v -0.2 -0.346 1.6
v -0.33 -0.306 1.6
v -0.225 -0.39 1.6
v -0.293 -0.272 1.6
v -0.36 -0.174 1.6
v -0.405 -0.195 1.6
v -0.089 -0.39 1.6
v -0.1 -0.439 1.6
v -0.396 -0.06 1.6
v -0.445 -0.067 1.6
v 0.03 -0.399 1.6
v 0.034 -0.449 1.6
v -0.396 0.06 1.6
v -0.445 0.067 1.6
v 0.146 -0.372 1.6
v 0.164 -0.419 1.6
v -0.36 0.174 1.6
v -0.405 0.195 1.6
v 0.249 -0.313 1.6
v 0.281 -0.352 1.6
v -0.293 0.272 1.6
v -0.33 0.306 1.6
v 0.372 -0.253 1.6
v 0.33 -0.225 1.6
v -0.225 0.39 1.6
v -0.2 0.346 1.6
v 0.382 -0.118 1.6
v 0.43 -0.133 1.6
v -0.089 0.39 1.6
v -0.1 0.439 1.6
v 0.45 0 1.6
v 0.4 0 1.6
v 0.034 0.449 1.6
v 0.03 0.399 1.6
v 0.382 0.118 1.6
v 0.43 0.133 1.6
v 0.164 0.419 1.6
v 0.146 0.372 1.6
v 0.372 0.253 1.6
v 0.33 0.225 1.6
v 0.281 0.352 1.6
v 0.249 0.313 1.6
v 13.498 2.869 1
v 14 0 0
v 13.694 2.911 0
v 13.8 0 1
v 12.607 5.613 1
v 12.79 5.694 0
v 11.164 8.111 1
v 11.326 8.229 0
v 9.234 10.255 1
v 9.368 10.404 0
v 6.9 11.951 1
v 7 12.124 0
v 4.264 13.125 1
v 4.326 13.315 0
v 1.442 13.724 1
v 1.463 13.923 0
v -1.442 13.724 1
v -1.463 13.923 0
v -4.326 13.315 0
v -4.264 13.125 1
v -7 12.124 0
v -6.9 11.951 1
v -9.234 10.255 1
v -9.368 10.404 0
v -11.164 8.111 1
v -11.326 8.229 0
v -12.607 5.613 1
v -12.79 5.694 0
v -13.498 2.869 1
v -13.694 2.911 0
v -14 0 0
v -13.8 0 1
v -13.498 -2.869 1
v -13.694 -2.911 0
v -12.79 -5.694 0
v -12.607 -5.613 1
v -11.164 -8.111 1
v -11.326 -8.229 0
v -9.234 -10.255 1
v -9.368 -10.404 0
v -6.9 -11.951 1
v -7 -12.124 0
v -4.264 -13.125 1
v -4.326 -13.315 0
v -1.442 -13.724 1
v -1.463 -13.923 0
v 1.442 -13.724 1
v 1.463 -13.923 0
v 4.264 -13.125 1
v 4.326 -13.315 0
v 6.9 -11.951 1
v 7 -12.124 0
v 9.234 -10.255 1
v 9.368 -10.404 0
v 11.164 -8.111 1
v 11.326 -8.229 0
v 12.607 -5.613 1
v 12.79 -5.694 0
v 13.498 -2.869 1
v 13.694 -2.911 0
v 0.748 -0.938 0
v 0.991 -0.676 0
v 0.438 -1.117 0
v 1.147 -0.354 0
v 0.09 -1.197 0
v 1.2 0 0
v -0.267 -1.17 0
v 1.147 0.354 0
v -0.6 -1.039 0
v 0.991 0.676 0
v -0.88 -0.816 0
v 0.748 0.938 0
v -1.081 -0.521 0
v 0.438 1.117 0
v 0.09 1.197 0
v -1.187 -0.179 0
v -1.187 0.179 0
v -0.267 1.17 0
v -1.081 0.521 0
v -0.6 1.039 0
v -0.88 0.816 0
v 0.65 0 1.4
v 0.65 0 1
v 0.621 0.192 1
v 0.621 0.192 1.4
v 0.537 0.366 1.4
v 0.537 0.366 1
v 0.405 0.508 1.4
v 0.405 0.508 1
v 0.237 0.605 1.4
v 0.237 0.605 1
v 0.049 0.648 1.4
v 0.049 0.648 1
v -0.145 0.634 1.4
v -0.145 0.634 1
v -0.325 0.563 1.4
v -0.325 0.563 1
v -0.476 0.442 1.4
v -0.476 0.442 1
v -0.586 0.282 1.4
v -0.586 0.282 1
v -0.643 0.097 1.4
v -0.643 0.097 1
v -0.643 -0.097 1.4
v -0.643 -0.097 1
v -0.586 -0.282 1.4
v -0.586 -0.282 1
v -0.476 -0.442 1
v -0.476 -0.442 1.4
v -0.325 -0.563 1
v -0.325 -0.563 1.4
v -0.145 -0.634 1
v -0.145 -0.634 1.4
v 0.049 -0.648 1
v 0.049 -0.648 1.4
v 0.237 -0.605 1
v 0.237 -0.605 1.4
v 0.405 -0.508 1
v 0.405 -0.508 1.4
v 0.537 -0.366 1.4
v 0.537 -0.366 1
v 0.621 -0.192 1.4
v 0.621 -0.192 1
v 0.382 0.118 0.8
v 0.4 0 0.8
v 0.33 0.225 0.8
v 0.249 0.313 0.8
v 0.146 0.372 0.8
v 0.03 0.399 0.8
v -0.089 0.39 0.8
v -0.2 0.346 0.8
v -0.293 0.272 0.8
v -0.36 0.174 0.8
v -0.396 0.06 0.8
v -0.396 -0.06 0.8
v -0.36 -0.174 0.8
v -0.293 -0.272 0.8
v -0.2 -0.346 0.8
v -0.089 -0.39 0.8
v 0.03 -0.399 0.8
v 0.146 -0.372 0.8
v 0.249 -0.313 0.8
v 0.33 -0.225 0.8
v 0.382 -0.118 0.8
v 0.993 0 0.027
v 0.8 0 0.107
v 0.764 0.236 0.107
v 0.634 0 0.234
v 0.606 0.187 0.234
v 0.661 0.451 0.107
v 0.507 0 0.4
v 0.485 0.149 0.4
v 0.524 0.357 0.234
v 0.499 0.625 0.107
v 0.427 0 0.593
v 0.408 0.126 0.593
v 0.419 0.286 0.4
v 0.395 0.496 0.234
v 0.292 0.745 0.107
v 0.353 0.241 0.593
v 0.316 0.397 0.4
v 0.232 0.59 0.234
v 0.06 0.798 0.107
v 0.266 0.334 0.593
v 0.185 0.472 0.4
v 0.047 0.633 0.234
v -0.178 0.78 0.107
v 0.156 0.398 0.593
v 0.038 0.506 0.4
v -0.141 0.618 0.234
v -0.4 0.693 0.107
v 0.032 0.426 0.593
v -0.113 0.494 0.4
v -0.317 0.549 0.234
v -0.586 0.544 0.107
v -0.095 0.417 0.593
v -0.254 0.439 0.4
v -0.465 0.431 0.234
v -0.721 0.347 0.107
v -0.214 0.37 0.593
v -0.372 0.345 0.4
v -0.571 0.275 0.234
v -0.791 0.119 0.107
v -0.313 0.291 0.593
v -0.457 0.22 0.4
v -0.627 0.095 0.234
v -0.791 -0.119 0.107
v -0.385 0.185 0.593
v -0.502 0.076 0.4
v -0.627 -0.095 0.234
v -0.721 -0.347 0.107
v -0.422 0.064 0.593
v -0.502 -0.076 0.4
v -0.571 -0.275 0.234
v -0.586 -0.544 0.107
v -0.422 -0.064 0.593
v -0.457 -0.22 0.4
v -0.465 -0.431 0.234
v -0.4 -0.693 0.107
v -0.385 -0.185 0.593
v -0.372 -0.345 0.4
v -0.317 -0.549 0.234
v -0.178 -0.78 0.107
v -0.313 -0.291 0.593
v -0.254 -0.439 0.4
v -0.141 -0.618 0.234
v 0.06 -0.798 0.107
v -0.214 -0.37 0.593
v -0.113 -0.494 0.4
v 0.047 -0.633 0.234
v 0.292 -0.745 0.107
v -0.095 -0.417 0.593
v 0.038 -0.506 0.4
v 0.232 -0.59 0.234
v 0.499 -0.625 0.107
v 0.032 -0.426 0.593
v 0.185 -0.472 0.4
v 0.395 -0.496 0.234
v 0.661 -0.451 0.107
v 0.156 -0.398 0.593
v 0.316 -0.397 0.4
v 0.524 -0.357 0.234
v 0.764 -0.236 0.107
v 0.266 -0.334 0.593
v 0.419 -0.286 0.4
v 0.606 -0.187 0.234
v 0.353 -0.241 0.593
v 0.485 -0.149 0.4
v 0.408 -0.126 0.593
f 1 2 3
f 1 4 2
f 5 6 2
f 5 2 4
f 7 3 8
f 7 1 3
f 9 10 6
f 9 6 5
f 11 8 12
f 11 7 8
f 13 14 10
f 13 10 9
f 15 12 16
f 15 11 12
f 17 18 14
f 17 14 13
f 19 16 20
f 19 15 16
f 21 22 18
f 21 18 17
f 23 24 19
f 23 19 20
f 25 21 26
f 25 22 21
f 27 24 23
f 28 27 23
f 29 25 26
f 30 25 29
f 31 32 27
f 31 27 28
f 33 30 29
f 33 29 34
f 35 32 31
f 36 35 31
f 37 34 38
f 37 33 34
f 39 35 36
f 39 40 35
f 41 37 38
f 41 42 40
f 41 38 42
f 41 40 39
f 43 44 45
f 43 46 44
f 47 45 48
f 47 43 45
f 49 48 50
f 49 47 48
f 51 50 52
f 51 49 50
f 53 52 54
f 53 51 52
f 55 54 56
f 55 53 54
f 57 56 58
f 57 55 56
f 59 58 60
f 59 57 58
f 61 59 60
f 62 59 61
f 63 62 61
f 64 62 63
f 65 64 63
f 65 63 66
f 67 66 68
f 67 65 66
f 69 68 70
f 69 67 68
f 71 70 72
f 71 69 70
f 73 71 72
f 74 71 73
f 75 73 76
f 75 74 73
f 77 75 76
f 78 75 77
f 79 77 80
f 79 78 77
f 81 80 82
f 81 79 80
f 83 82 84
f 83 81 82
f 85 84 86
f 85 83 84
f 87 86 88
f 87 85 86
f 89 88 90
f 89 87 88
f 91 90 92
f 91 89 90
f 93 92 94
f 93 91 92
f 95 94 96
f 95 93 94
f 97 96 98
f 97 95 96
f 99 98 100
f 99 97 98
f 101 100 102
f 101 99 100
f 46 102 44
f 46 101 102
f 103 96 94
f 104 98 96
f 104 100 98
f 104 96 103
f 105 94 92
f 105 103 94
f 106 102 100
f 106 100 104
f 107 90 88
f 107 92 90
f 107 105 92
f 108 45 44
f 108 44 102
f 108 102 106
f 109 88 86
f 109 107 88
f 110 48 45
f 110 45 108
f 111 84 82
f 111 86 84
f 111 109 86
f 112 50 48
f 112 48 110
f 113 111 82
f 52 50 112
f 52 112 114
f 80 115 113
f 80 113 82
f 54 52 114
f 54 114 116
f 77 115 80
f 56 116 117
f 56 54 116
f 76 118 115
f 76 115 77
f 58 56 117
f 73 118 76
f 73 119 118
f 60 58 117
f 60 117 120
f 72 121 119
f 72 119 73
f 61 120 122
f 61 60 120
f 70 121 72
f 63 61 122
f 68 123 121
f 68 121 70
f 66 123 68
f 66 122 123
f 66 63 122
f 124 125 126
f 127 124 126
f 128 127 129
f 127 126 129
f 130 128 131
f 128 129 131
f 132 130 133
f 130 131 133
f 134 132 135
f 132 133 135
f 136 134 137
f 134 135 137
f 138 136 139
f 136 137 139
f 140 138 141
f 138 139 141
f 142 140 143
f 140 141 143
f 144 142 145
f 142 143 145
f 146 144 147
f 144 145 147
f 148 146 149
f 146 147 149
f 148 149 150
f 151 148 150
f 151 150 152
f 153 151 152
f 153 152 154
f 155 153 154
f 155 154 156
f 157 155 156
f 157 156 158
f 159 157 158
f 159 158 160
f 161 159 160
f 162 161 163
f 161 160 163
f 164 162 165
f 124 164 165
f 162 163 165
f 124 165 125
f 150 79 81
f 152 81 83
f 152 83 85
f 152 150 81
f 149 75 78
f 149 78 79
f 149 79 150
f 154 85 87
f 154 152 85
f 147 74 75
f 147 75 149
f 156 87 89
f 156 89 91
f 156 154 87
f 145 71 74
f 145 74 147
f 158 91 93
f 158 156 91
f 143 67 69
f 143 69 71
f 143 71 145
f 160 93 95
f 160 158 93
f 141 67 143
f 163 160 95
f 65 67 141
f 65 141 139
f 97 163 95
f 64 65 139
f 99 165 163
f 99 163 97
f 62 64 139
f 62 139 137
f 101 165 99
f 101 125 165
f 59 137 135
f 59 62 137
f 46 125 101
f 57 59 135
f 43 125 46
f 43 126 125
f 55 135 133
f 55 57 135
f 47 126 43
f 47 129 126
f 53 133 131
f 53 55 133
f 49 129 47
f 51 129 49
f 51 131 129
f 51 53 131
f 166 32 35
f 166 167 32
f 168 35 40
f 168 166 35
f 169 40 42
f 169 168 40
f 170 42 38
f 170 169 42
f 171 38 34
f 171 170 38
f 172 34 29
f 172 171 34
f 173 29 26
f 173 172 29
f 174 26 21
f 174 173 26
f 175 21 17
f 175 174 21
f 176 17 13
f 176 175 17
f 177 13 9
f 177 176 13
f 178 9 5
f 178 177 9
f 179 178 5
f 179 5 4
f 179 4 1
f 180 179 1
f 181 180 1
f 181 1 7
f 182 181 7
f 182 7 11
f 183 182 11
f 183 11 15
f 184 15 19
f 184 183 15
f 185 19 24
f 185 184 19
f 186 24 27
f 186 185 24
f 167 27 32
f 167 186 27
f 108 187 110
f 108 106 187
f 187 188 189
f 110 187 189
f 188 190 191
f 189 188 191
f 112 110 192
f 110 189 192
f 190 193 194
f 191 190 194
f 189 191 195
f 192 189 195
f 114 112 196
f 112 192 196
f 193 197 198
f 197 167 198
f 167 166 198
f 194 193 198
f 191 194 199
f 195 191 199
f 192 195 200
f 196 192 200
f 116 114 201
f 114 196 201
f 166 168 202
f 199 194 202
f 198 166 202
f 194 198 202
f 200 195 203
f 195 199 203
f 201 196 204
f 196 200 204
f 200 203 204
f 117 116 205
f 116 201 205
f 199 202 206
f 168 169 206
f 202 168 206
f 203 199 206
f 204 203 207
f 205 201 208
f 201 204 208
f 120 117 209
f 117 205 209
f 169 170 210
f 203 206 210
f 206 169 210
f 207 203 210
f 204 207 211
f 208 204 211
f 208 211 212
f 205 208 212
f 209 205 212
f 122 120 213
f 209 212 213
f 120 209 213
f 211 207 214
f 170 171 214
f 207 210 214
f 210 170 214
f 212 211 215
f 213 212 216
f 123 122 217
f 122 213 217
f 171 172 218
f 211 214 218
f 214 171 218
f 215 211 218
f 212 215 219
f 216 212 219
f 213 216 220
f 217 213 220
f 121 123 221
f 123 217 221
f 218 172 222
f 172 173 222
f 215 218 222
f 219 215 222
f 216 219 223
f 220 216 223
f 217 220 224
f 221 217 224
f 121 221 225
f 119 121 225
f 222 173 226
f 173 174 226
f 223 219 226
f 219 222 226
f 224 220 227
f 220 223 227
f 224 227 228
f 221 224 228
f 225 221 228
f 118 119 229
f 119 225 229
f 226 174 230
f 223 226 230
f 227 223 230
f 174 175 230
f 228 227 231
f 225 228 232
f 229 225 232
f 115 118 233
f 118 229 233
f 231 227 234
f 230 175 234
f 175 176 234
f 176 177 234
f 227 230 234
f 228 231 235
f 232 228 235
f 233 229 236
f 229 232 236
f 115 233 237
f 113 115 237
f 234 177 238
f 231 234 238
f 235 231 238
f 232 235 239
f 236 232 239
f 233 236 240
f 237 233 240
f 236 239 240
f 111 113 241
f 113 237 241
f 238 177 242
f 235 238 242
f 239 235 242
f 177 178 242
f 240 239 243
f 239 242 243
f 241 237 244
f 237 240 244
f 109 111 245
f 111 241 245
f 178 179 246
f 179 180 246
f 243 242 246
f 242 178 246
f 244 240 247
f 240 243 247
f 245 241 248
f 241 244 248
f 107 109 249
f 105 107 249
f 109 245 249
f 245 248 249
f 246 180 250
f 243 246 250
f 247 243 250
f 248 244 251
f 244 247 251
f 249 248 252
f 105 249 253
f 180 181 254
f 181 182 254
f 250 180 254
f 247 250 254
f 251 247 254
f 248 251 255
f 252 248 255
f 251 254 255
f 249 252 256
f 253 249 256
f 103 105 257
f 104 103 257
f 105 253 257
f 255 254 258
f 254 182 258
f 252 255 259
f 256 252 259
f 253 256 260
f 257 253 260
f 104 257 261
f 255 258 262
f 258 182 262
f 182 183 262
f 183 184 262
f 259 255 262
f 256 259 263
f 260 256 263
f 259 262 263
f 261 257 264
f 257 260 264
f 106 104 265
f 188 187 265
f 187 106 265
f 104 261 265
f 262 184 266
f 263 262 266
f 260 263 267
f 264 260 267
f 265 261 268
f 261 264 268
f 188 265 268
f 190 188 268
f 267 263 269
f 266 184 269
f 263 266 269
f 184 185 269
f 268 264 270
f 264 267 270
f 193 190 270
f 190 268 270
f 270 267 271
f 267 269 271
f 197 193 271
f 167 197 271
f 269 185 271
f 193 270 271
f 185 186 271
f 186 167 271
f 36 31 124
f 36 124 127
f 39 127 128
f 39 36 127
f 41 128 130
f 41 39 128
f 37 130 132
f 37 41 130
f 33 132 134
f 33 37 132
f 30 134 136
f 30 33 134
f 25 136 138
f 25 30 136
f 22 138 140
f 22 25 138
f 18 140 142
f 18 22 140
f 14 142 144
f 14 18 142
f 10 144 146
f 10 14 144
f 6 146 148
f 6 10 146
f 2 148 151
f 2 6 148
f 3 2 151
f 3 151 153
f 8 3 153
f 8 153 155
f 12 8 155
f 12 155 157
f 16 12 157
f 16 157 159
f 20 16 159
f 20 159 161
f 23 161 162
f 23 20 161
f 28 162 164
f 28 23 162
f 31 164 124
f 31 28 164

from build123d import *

# Parameters (mm, degrees)
CYLINDER002_R     = 0.4
CYLINDER002_DEPTH = 0.6
CYLINDER001_R     = 0.65
CYLINDER001_DEPTH = 0.6
CHAMFER_SIZE      = 0.2
CYLINDER_R        = 0.4
CYLINDER_DEPTH    = 1
FILLET_R          = 0.8


with BuildPart() as cylinder002:
    # Cylinder002 → Cylinder002 (new body)
    with BuildSketch(Plane.XY.offset(1)):
        Circle(CYLINDER002_R)
    extrude(amount=CYLINDER002_DEPTH)


with BuildPart() as chamfer_body:
    # Cylinder001 → Cylinder001 (new body)
    with BuildSketch(Plane.XY.offset(1)):
        Circle(CYLINDER001_R)
    extrude(amount=CYLINDER001_DEPTH)

    # Cut001: cut Cylinder002
    add(cylinder002.part, mode=Mode.SUBTRACT)

    # Chamfer
    chamfer_edges = [chamfer_body.edges().sort_by_distance(p)[0] for p in [
        (-0.65, 0, 1.6),
    ]]
    chamfer(chamfer_edges, length=CHAMFER_SIZE)


with BuildPart() as cylinder:
    # Cylinder → Cylinder (new body)
    with BuildSketch(Plane.XY):
        Circle(CYLINDER_R)
    extrude(amount=CYLINDER_DEPTH)


with BuildPart() as fusion:
    # Cone → Cone (revolve)
    with BuildSketch(Plane.XZ):
        Polygon((0, 0), (14, 0), (13.8, 1), (0, 1), align=None)
    revolve(axis=Axis((0, 0, 0), (0, 0, 1)))

    # Cut: cut Cylinder
    add(cylinder.part, mode=Mode.SUBTRACT)

    # Fillet
    fillet_edges = [fusion.edges().sort_by_distance(p)[0] for p in [
        (-0.4, 0, 0),
    ]]
    fillet(fillet_edges, radius=FILLET_R)

    # Fusion: union Chamfer body
    add(chamfer_body.part)


solid = fusion.part
